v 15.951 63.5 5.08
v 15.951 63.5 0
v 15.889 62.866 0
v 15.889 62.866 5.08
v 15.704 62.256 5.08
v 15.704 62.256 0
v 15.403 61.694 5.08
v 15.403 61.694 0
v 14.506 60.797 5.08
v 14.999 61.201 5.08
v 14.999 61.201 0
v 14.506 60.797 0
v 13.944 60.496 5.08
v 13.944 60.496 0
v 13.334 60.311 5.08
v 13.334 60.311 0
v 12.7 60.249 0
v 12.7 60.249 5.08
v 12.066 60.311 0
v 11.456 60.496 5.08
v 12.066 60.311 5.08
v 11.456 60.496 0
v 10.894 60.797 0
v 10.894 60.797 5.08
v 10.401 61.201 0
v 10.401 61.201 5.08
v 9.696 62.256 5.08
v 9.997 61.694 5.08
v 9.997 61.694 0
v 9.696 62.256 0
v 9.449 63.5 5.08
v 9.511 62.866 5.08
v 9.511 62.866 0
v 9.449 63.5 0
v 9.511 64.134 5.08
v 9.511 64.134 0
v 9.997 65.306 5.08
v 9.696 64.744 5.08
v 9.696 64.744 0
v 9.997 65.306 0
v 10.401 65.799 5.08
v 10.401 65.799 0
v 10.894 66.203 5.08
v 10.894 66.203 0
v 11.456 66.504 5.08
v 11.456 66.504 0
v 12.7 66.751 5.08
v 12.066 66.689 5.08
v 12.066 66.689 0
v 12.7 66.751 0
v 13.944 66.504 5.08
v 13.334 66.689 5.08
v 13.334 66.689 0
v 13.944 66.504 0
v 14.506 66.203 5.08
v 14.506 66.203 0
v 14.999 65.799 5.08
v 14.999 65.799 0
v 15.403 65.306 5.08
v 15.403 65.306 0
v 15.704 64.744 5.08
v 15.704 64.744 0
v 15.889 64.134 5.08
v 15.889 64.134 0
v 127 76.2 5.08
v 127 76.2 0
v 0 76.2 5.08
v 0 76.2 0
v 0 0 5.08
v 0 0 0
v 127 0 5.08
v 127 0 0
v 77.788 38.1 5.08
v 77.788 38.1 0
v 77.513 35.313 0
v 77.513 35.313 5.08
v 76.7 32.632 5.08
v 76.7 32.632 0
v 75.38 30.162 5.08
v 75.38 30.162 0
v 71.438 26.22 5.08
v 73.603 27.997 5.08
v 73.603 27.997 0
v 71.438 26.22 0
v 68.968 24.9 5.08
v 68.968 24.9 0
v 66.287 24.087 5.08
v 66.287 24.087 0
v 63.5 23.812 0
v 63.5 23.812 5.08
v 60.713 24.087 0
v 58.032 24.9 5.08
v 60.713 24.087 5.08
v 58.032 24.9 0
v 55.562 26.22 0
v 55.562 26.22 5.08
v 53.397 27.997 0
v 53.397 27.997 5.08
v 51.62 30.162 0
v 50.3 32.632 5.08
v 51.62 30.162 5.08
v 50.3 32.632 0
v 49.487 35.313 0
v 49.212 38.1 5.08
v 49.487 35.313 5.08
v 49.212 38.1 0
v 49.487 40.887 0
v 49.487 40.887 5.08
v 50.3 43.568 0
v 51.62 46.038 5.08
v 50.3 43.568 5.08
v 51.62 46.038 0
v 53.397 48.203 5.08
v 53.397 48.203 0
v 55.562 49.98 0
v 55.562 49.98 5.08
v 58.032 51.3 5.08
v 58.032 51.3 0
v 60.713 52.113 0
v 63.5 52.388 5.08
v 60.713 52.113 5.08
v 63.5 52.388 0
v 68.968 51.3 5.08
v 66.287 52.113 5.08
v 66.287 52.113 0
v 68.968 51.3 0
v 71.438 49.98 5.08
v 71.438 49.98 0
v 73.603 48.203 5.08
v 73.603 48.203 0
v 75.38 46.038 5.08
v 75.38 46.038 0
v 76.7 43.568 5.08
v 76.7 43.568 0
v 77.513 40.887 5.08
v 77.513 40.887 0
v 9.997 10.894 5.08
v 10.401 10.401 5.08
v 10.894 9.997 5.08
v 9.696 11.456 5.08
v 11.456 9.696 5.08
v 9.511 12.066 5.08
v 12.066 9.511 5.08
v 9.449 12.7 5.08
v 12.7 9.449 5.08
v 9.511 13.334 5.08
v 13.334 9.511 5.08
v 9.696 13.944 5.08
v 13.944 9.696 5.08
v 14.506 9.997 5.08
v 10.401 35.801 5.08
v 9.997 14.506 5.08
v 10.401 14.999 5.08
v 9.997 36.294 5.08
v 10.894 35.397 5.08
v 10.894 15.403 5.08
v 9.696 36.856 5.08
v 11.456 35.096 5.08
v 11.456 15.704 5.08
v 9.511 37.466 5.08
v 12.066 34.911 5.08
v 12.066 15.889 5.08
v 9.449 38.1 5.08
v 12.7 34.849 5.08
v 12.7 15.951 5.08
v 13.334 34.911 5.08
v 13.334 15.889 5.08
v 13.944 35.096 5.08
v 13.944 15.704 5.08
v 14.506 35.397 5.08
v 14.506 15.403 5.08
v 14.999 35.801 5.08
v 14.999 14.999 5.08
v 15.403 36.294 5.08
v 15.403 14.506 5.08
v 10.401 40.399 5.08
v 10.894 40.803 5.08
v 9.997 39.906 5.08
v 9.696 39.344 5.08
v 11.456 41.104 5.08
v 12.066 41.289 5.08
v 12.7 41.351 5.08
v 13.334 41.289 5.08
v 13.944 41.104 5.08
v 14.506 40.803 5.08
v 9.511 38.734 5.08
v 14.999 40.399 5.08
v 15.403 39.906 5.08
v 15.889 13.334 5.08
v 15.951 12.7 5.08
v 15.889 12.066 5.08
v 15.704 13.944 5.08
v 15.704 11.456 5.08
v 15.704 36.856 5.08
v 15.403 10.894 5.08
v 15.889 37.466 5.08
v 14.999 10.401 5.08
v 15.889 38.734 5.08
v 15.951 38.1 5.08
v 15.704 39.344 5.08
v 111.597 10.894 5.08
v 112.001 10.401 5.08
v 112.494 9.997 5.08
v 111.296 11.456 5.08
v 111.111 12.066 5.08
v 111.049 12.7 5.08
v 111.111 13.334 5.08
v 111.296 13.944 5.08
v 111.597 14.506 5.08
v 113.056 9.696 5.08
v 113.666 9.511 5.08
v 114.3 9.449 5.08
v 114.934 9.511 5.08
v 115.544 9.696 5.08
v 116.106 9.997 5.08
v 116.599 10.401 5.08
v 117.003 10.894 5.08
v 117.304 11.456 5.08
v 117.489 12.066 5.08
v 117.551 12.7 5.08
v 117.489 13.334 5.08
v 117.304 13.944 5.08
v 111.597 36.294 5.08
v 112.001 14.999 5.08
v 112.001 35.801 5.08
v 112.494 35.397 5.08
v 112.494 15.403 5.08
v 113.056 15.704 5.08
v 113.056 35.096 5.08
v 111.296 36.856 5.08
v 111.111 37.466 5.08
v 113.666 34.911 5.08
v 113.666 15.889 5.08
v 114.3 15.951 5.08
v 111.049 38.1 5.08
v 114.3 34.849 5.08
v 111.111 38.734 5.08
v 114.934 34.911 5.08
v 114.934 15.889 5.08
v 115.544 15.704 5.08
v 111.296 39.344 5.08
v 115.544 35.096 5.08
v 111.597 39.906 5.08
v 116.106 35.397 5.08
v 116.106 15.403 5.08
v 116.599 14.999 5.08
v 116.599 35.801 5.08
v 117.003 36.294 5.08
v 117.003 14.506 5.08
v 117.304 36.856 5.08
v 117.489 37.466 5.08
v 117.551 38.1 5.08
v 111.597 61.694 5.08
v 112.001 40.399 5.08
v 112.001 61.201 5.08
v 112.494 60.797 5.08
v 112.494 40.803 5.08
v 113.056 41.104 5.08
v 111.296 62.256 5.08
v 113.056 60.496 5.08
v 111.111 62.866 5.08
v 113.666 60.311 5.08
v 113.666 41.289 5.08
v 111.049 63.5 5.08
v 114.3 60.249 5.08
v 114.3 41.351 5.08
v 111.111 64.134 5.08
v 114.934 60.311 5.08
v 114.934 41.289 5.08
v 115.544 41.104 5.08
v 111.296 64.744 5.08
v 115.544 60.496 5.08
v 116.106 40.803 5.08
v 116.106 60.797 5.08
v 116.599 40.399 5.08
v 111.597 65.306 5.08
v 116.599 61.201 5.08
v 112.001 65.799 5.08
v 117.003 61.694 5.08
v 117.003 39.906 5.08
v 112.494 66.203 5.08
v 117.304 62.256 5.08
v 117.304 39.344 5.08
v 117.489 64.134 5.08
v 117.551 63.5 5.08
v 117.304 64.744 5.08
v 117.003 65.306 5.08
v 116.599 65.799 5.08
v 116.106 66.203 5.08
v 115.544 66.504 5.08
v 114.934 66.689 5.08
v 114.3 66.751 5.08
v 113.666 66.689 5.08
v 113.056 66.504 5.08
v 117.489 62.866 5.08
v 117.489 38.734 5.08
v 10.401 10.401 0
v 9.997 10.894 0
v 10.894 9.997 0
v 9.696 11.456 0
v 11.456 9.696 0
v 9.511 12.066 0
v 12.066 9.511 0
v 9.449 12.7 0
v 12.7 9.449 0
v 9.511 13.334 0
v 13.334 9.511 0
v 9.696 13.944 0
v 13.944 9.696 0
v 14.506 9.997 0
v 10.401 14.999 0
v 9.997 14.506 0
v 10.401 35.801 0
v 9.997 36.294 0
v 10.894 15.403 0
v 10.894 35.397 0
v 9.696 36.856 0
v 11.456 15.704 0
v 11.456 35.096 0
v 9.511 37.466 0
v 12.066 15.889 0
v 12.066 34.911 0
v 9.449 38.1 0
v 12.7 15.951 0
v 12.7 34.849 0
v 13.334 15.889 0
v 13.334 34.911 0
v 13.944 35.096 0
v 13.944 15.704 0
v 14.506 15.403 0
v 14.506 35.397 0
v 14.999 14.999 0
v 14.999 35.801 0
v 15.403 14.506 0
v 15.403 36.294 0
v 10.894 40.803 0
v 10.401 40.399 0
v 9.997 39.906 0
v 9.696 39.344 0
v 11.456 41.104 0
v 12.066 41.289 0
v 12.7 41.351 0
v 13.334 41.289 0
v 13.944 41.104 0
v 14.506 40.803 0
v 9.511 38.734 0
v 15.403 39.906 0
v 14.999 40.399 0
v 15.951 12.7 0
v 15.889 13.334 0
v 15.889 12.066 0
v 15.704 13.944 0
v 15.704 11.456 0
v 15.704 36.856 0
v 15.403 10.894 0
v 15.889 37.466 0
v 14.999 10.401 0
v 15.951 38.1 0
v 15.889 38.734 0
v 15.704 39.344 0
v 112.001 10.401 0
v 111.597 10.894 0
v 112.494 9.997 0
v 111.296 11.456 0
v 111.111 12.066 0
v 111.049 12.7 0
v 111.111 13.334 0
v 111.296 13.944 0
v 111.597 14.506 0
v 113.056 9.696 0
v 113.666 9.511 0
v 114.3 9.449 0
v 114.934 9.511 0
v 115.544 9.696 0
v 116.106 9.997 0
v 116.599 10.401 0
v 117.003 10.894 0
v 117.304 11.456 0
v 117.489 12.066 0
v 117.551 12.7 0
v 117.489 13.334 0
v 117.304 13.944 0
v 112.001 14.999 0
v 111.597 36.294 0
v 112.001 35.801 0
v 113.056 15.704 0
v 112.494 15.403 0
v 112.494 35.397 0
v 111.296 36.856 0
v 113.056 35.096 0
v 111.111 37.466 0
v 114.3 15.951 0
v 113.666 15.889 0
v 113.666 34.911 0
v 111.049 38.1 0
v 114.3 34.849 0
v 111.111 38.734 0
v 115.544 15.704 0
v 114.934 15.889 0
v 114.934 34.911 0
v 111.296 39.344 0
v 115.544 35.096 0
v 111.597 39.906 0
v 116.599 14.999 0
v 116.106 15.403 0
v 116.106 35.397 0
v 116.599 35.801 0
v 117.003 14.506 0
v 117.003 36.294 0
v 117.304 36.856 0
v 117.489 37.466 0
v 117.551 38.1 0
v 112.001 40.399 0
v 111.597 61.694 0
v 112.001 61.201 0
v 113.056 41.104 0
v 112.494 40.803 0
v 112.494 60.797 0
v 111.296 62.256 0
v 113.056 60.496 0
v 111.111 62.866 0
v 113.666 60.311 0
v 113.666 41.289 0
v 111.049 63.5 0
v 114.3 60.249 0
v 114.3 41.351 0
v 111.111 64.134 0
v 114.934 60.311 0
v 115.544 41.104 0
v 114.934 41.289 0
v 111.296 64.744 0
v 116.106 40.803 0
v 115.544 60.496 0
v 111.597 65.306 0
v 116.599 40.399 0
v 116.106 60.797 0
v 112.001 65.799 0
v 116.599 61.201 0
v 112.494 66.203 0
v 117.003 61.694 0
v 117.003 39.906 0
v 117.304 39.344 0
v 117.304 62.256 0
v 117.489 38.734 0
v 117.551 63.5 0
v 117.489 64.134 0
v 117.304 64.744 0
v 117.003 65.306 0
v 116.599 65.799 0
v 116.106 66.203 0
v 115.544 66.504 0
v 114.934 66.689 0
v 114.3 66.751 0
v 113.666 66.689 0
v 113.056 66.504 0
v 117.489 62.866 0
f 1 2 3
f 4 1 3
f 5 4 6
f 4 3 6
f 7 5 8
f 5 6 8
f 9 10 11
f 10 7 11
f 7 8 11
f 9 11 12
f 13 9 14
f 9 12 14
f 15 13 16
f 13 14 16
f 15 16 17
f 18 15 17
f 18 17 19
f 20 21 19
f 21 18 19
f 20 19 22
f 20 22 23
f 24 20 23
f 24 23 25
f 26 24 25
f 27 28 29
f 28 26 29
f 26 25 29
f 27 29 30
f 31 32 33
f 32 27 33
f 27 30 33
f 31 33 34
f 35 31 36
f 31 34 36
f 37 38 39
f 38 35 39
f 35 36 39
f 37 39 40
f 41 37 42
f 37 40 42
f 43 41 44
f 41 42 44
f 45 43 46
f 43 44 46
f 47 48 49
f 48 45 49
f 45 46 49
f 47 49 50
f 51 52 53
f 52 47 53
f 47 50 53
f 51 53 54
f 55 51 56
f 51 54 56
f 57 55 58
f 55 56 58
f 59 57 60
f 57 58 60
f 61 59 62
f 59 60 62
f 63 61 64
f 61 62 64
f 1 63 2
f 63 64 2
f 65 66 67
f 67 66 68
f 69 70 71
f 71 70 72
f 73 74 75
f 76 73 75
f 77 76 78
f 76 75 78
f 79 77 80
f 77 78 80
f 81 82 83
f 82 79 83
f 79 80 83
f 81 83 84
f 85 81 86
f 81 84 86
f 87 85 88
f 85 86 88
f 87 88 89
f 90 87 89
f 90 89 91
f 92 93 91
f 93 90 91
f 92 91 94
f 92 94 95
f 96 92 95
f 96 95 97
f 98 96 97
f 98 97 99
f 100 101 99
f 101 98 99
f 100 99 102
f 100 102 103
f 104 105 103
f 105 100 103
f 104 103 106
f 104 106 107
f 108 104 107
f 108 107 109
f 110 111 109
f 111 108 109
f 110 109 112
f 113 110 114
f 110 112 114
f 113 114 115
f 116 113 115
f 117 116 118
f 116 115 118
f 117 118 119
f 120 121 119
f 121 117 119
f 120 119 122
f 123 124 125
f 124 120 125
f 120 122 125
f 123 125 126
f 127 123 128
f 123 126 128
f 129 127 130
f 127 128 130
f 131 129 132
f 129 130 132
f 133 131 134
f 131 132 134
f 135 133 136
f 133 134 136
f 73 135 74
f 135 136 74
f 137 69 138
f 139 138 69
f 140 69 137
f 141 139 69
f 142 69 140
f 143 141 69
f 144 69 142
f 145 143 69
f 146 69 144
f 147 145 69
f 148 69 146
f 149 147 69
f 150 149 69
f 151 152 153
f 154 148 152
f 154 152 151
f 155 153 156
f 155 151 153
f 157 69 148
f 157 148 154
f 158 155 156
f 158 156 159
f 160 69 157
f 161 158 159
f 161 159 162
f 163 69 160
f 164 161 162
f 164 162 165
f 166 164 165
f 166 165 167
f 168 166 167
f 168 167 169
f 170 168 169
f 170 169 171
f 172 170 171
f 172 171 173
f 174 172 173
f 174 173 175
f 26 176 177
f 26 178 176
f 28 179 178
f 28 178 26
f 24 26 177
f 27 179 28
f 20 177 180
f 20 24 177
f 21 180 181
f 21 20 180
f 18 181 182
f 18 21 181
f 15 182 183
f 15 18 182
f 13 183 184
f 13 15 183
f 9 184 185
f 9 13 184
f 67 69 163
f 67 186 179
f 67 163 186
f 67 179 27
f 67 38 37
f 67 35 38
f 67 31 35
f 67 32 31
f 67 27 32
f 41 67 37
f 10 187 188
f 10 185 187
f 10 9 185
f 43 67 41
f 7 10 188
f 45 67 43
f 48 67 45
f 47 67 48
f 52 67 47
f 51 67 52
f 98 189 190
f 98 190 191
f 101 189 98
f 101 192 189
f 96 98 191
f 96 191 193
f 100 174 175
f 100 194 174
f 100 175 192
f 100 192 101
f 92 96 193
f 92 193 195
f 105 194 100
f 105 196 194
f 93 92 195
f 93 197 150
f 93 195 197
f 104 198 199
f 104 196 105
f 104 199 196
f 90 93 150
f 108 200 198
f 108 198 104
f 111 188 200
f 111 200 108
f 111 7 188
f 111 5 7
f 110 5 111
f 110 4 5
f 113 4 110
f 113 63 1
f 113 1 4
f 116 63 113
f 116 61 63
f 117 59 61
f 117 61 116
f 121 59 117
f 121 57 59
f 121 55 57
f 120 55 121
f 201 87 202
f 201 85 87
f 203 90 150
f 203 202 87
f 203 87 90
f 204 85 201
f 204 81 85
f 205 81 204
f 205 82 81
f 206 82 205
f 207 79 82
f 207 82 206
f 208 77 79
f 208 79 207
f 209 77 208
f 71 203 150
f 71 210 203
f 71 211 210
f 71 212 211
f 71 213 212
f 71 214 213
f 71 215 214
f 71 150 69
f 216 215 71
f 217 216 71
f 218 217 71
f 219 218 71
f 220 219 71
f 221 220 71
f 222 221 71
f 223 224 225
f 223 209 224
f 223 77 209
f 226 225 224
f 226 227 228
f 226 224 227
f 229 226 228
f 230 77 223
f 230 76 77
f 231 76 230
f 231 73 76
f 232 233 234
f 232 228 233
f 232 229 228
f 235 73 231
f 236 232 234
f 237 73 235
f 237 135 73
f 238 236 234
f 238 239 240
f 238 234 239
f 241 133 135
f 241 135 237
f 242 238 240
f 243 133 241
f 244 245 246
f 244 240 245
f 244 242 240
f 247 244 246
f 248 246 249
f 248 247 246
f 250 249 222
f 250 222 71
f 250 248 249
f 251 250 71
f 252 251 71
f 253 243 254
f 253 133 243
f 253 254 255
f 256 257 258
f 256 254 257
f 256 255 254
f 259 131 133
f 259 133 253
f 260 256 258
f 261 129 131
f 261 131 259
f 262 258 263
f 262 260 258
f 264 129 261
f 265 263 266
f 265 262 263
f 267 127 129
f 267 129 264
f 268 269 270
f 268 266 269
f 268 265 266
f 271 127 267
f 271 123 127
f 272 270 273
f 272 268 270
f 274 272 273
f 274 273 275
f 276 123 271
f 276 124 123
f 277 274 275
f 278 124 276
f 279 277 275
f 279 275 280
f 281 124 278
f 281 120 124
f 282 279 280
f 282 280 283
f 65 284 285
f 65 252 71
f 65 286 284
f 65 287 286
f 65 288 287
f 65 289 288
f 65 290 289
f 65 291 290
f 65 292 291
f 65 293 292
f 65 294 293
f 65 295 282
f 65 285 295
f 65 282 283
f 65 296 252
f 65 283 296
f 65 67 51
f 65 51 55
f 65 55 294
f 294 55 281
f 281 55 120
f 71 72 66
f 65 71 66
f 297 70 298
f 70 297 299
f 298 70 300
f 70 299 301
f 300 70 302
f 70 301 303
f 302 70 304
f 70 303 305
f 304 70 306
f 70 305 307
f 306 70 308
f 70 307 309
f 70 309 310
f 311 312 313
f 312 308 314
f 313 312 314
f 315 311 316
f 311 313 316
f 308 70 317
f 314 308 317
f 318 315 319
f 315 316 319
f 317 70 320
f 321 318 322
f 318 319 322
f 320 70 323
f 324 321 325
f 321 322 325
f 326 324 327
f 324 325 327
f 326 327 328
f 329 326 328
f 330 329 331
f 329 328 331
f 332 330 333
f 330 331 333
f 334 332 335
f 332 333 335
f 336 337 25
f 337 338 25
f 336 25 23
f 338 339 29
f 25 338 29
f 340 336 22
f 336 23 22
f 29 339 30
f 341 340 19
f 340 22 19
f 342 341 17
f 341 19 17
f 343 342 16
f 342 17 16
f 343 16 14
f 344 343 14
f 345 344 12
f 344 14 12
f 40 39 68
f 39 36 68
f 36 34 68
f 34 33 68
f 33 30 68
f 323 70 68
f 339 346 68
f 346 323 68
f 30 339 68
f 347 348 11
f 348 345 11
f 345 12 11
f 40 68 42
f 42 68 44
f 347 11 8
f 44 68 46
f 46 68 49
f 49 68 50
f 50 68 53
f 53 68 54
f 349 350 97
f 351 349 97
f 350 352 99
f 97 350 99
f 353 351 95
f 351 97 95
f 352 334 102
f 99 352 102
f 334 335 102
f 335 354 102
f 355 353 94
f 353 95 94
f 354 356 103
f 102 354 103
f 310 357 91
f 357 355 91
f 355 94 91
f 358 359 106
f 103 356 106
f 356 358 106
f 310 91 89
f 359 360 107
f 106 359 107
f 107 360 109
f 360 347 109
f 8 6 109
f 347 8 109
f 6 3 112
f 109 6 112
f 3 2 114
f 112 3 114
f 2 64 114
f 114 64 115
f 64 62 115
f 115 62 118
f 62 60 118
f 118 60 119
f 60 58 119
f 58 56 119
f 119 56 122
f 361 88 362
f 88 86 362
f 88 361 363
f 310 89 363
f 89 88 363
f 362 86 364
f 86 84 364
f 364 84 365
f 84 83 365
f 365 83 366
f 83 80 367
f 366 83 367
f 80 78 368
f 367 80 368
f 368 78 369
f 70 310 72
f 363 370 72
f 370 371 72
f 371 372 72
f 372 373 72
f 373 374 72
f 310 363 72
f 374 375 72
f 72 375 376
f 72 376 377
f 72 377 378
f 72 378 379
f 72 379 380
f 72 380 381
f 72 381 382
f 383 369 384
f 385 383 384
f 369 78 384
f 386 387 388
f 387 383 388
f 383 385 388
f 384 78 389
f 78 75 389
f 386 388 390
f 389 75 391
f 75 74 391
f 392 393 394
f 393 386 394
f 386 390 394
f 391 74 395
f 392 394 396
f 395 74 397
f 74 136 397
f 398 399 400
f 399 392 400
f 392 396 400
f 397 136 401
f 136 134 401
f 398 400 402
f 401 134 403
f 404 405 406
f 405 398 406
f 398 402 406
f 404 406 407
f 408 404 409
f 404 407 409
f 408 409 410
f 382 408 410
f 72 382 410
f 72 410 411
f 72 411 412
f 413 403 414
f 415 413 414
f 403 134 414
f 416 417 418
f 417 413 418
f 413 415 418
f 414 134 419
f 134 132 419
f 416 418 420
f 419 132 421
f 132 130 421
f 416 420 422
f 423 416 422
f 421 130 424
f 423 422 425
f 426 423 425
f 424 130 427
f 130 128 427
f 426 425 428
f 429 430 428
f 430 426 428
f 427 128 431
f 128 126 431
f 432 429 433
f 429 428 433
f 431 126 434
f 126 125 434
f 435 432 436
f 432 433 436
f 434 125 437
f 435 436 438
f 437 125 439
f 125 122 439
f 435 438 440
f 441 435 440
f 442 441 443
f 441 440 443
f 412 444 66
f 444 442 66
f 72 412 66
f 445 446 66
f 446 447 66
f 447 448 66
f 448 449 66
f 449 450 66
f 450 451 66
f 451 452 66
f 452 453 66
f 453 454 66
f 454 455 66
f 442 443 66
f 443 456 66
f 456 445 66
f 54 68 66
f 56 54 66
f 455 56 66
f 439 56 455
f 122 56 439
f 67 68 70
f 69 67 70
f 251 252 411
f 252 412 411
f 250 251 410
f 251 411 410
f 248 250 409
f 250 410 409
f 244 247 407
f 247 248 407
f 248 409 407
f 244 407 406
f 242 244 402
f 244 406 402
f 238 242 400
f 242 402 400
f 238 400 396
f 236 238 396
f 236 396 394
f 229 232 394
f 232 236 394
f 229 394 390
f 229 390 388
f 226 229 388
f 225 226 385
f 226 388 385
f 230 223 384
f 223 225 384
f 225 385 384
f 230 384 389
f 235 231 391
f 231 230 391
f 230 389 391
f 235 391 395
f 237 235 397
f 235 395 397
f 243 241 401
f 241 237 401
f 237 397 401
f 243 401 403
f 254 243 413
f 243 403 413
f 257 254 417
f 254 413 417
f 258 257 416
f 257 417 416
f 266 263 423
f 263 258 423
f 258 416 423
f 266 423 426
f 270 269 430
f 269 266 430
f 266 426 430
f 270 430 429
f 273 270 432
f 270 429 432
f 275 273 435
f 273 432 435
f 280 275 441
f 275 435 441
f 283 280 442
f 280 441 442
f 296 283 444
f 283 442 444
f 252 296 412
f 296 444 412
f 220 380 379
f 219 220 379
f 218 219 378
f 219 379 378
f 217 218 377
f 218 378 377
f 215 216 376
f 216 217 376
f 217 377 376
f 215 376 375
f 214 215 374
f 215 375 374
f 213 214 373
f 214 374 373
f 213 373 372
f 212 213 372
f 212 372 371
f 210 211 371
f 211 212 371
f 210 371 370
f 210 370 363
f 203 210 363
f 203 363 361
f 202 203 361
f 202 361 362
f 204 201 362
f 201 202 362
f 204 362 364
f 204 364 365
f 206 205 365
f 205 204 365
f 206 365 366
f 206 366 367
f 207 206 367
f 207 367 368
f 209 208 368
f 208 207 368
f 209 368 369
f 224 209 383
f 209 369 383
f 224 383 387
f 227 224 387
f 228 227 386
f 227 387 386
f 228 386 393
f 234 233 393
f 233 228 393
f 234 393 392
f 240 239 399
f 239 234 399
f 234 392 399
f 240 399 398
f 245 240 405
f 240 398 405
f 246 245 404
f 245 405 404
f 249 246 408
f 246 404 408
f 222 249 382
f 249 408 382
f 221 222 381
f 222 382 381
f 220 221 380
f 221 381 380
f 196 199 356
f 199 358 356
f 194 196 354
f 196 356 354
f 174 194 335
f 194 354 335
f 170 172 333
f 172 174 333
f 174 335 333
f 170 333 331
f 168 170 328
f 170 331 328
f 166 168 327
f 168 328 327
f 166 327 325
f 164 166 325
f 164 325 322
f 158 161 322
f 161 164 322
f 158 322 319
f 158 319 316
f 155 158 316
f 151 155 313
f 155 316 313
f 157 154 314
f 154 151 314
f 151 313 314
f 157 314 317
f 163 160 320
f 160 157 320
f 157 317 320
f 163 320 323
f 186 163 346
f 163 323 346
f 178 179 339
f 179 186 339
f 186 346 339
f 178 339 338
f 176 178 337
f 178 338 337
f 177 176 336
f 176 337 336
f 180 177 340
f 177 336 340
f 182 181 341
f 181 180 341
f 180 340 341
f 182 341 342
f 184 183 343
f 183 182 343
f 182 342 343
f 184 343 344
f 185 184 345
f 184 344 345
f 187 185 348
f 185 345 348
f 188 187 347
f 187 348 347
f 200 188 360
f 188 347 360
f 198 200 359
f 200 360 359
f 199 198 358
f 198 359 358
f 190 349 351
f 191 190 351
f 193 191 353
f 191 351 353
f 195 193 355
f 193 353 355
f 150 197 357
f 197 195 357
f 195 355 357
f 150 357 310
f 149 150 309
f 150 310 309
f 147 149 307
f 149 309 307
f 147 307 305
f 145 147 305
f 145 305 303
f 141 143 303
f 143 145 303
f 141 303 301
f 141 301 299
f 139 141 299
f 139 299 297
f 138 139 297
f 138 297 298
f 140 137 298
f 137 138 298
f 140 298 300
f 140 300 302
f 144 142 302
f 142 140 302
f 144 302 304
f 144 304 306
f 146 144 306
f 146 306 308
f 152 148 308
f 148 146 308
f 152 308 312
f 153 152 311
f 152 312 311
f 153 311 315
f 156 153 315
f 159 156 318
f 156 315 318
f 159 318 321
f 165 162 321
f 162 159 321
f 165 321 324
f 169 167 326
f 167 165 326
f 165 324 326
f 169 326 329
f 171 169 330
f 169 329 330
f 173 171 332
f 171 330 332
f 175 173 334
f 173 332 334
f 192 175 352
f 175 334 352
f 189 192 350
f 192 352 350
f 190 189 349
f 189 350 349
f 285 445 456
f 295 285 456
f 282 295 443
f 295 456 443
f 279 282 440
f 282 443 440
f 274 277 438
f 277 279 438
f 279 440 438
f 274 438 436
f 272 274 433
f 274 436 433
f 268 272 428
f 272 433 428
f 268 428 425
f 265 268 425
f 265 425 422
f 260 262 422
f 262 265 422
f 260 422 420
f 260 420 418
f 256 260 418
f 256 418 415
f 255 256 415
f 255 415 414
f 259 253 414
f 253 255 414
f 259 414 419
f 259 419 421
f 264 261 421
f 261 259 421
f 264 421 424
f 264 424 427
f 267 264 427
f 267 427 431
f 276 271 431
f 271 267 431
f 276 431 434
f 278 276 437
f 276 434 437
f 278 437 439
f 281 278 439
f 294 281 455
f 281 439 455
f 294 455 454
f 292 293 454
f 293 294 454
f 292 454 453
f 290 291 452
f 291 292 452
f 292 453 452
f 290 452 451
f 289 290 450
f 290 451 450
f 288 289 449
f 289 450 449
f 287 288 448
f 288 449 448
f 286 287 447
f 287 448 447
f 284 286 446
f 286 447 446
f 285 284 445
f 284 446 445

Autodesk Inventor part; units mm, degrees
ref_plane "YZ Plane" through (0, 0, 0) normal (1, 0, 0) x (0, 1, 0)
ref_plane "XZ Plane" through (0, 0, 0) normal (0, 1, 0) x (-1, 0, 0)
ref_plane "XY Plane" through (0, 0, 0) normal (0, 0, 1) x (1, 0, 0)
sketch "Sketch1" plane through (0, 0, 0) normal (0, 0, 1) x (1, 0, 0)
  line L0 (0, 0) -> (127, 0)
  line L1 (127, 0) -> (127, 76.2)
  line L2 (127, 76.2) -> (0, 76.2)
  line L3 (0, 76.2) -> (0, 0)
  circle A0 centre (63.5, 38.1) radius 14.2875
  circle A1 centre (12.7, 63.5) radius 3.2512
  circle A2 centre (12.7, 38.1) radius 3.2512
  circle A3 centre (12.7, 12.7) radius 3.2512
  circle A4 centre (114.3, 63.5) radius 3.2512
  circle A5 centre (114.3, 38.1) radius 3.2512
  circle A6 centre (114.3, 12.7) radius 3.2512
  dimension "d0" = 127
  dimension "d1" = 76.2
  dimension "d2" = 38.1
  dimension "d3" = 63.5
  dimension "d4" = 28.575
  dimension "d5" = 6.5024
  dimension "d6" = 12.7
  dimension "d7" = 12.7
  dimension "d10" = 25.4
  dimension "d19" = 101.6
extrude "Extrusion2" add sketch "Sketch1" along normal blind 5.08
equation "\"d2\" = 0.5 * d1"
properties part number "Bearing Plate Short"
